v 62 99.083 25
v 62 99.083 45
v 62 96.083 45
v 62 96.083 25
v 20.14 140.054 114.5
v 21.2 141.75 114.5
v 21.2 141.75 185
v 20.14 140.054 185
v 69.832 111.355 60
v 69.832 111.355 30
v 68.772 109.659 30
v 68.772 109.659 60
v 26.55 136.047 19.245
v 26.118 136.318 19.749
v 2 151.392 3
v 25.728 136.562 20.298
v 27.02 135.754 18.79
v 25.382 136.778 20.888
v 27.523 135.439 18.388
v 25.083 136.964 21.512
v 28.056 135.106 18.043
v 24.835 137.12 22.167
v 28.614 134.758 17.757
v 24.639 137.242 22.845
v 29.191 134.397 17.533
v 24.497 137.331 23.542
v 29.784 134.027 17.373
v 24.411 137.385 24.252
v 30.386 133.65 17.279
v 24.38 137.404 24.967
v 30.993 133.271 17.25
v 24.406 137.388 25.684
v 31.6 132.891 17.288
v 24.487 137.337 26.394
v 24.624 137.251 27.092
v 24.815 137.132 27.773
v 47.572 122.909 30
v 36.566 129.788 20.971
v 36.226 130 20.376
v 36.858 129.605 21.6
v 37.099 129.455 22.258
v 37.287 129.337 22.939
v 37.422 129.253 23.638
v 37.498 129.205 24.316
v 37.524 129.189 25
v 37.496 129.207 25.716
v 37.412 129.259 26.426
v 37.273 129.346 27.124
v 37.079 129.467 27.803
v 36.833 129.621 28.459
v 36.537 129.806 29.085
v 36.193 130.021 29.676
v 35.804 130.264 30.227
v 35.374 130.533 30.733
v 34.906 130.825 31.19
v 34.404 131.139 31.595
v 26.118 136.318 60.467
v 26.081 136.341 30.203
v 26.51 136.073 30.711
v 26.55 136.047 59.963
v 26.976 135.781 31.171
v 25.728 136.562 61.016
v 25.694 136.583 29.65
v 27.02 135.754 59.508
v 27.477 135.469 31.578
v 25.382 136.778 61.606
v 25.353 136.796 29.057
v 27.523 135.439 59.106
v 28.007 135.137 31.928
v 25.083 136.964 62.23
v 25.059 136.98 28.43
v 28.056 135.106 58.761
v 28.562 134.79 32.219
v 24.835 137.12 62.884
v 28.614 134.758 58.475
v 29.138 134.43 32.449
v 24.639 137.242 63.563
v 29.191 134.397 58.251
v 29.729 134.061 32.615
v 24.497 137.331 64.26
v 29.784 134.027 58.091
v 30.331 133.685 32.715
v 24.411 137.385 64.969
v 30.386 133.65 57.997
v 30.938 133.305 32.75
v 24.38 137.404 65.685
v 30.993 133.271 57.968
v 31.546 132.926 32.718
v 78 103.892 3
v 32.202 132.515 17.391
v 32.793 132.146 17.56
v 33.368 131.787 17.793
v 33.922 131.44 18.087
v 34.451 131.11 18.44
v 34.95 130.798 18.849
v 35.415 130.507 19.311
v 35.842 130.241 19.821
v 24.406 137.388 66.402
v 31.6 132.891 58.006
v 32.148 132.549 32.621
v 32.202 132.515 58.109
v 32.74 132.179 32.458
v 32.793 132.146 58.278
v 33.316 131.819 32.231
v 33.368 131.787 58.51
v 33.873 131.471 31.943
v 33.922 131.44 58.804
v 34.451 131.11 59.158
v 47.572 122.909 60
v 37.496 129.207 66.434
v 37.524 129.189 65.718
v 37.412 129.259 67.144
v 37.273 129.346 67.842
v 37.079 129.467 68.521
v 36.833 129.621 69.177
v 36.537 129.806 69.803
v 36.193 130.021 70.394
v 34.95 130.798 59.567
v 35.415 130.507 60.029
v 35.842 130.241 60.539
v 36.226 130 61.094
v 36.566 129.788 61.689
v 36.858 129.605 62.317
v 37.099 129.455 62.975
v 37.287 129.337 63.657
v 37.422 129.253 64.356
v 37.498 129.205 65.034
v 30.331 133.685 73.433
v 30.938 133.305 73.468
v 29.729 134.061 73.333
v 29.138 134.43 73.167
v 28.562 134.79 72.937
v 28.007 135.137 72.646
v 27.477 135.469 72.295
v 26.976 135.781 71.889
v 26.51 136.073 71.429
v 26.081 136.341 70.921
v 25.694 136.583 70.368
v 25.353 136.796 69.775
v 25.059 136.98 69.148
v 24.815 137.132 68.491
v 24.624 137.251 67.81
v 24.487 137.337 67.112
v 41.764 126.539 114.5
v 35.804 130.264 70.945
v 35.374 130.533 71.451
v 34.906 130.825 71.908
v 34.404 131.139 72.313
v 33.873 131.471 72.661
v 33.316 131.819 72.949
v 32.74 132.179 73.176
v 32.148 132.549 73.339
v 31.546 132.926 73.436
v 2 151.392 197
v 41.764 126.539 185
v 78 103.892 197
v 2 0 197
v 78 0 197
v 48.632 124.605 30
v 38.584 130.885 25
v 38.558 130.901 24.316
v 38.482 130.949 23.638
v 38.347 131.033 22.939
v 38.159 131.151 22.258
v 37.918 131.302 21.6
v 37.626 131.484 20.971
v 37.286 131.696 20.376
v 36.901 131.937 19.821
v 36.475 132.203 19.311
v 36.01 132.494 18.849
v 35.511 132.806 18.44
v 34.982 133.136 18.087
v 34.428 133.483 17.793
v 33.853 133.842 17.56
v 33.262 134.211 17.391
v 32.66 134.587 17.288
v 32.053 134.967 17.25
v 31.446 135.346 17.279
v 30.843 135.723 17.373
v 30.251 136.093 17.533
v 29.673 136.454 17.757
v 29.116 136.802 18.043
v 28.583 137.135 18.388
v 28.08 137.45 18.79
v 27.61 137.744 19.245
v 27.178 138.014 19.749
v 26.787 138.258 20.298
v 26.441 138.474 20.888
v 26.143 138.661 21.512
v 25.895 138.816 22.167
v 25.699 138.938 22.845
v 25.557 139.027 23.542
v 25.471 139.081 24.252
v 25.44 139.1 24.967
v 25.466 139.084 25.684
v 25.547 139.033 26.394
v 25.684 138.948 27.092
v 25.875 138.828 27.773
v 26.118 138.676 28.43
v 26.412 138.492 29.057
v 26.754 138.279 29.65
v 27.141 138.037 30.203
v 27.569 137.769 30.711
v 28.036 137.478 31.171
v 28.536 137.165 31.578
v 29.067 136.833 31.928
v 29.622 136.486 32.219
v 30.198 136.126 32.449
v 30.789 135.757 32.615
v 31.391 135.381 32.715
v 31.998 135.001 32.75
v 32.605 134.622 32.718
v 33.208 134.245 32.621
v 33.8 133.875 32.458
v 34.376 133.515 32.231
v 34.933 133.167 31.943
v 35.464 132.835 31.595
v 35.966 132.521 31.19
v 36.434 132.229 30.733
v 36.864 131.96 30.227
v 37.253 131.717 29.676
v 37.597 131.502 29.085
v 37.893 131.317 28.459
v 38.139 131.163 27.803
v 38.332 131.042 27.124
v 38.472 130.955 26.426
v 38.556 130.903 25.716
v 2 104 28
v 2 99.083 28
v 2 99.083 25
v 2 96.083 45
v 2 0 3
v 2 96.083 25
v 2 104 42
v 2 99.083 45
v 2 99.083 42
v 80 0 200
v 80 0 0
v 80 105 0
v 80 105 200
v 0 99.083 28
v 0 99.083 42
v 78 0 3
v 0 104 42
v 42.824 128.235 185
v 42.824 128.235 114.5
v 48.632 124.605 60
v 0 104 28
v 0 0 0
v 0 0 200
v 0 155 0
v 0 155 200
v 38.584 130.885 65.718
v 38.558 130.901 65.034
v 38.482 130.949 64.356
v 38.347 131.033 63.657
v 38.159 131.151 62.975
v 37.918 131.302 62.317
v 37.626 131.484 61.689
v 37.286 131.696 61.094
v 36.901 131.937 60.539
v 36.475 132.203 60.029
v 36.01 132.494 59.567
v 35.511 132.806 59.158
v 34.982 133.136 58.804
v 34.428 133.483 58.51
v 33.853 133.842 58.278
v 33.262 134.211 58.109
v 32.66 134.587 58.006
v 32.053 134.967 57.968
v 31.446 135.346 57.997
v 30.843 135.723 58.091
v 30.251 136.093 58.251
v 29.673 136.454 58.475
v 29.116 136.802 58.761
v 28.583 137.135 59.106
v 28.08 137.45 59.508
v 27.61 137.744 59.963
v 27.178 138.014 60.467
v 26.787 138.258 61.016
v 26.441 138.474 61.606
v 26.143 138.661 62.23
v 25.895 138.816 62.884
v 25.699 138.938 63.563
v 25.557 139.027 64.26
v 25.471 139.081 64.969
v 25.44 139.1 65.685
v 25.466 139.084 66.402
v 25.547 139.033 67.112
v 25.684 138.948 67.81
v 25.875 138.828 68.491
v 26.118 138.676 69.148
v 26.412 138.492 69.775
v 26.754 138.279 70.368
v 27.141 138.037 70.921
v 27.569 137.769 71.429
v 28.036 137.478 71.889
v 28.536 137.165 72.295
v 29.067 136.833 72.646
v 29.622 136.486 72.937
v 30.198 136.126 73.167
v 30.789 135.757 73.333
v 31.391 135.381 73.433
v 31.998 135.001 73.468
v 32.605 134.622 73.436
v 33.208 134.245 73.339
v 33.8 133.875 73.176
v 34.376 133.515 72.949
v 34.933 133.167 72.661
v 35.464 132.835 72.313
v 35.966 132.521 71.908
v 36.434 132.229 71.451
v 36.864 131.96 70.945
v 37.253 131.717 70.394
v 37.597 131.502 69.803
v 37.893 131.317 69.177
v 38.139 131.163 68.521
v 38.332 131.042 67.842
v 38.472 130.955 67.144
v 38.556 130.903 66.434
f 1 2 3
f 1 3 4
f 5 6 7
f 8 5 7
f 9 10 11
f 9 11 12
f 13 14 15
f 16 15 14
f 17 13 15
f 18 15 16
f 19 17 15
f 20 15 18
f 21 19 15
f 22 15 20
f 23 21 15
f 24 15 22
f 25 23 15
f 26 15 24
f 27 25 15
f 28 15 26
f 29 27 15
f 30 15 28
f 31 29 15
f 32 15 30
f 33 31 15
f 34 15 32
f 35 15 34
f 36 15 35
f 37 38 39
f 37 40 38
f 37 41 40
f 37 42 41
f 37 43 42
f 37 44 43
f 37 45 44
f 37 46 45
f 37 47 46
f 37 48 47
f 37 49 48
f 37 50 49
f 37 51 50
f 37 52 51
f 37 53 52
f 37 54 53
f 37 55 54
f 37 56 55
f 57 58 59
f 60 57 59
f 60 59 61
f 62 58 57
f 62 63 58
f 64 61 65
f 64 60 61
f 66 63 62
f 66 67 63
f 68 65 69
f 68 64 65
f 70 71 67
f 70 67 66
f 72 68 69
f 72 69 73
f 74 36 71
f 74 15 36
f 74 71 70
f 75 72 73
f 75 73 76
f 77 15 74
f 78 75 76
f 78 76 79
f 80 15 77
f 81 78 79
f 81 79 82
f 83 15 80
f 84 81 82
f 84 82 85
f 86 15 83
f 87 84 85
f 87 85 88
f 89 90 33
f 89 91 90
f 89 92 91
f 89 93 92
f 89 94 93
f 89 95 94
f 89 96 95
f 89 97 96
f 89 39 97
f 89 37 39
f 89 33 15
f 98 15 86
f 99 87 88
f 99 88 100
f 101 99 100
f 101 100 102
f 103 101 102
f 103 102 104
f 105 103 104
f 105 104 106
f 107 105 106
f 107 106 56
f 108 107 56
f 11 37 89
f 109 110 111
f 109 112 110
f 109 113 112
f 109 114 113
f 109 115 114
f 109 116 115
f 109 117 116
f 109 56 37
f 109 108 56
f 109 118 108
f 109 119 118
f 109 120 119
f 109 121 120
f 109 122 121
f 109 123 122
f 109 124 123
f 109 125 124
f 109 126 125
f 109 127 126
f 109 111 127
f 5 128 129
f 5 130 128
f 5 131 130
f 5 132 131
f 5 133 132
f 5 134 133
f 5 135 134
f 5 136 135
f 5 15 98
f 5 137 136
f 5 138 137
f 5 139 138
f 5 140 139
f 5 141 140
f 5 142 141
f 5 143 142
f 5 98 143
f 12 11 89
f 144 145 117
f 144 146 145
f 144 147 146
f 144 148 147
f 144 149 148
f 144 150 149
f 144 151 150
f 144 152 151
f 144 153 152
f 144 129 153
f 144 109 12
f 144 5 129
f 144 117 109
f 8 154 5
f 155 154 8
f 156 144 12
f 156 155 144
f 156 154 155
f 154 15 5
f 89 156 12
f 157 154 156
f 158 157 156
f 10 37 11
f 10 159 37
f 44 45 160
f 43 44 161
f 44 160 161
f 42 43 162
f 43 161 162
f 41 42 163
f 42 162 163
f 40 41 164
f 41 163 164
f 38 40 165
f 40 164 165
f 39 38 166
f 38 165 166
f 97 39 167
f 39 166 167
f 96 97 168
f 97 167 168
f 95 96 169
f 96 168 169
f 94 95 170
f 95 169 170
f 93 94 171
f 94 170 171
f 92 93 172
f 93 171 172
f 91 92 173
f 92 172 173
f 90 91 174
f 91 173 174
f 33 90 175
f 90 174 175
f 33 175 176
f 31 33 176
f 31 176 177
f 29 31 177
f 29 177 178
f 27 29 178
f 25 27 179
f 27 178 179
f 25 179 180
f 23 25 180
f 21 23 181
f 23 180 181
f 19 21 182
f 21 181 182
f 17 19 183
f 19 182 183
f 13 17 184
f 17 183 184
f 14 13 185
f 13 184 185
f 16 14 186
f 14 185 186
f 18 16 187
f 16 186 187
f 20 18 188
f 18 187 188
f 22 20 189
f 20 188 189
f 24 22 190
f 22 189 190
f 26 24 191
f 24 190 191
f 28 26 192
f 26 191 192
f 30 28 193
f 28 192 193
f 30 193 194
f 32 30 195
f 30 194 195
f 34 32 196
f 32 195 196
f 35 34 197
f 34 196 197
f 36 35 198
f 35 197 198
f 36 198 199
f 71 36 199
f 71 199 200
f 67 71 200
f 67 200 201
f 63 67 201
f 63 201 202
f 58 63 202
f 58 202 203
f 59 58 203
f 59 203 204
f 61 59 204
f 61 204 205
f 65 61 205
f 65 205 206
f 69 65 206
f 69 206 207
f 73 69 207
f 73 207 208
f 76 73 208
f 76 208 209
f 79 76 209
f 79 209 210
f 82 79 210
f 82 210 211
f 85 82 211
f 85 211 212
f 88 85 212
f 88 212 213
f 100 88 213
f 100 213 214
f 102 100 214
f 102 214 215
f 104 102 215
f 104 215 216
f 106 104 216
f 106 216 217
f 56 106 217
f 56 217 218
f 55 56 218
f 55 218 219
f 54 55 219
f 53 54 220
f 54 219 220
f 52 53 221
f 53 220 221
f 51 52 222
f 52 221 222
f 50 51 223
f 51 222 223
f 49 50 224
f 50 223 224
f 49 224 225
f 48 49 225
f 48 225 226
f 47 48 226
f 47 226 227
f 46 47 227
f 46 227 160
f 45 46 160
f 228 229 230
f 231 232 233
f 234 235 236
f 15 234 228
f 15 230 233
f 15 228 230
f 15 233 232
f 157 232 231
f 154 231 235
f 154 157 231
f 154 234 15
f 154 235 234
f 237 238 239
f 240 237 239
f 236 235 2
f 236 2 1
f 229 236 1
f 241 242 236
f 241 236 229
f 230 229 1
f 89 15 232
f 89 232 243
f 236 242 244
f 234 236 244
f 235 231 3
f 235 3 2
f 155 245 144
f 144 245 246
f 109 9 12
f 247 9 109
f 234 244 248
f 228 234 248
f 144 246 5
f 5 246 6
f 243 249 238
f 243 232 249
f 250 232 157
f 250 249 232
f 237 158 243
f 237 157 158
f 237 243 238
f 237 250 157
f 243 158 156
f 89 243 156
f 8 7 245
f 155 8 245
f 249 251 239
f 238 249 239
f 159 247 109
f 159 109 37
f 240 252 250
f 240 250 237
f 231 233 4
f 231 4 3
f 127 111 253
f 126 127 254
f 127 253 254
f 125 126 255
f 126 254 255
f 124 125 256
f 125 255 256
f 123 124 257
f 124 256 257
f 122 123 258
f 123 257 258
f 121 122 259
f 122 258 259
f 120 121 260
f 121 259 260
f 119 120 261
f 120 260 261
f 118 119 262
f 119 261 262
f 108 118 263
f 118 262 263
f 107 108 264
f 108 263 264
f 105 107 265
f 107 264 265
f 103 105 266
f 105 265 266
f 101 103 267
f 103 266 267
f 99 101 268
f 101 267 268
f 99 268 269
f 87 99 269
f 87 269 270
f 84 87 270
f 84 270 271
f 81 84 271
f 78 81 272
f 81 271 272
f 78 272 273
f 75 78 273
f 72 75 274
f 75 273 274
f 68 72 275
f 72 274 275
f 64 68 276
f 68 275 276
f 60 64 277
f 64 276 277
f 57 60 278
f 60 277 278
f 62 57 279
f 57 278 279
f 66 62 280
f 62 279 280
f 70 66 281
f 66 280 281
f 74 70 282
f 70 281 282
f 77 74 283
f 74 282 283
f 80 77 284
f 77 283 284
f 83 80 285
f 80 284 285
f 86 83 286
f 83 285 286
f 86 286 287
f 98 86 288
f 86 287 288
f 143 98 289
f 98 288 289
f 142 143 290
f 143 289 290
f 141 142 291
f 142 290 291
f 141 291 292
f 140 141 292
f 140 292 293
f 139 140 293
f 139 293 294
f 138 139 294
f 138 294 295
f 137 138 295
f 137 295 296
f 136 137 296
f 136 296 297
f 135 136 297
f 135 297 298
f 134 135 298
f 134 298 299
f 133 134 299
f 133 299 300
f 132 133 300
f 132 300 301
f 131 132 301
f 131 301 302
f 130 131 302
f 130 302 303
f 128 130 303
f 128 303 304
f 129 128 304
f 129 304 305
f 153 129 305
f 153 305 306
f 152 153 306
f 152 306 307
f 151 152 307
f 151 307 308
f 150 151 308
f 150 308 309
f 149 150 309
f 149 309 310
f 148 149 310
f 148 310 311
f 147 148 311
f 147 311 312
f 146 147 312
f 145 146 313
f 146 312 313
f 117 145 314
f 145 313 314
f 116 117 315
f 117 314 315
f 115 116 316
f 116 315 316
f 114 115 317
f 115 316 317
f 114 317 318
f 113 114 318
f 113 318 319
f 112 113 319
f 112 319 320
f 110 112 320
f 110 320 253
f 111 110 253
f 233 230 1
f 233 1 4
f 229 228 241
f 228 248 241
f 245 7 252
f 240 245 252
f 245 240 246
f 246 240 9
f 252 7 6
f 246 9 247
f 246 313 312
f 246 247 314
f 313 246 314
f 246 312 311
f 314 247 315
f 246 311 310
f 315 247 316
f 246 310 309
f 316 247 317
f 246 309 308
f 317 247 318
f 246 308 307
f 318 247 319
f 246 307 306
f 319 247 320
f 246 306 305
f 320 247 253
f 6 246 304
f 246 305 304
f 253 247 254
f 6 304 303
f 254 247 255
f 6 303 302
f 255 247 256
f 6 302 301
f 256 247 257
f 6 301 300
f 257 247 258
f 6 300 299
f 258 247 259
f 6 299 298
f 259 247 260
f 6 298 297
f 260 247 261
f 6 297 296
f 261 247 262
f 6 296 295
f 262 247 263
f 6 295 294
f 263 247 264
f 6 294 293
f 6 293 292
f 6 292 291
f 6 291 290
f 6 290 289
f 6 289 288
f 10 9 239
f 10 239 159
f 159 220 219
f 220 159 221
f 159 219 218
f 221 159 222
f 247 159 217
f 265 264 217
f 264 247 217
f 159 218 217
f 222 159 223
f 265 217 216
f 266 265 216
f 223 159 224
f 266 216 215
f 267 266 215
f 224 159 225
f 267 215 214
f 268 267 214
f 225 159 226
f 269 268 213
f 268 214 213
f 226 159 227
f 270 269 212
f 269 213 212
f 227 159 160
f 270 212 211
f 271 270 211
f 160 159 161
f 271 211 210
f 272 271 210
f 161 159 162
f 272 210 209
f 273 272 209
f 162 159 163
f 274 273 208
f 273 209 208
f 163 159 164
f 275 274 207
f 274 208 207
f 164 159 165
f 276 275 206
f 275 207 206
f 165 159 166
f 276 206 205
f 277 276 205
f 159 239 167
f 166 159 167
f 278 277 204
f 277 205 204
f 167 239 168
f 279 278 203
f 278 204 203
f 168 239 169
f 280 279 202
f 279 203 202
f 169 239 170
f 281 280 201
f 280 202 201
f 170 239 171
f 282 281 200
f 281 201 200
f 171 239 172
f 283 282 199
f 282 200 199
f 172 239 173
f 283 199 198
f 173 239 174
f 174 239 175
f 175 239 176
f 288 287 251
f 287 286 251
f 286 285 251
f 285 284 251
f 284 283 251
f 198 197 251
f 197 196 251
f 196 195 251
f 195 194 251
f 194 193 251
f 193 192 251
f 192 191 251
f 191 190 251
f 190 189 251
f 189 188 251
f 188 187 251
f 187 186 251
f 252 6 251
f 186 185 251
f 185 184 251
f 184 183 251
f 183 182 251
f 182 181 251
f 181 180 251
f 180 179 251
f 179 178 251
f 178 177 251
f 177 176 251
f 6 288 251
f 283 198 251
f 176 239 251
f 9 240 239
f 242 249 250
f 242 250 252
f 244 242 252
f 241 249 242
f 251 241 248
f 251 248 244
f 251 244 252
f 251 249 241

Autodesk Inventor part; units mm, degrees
ref_plane "YZ Plane" through (0, 0, 0) normal (1, 0, 0) x (0, 1, 0)
ref_plane "XZ Plane" through (0, 0, 0) normal (0, 1, 0) x (-1, 0, 0)
ref_plane "XY Plane" through (0, 0, 0) normal (0, 0, 1) x (1, 0, 0)
sketch "Sketch1" plane through (0, 0, 0) normal (0, 0, 1) x (1, 0, 0)
  line L0 (0, 0) -> (80, 0)
  line L1 (0, 0) -> (0, 155)
  line L2 (80, 0) -> (80, 105)
  line L3 (80, 105) -> (0, 155)
  dimension "d0" = 80
  dimension "d1" = 155
  dimension "d2" = 105
extrude "Extrusion1" add sketch "Sketch1" along normal blind 200
sketch "Sketch3" plane through (0, 0, 200) normal (0, 0, 1) x (1, 0, 0)
  line L0 (2, 0) -> (2, 151.3915)
  line L1 (80, 0) -> (80, 105) projected
  line L2 (78, 0) -> (78, 103.8915)
  line L3 (80, 105) -> (0, 155) projected
  line L4 (2, 151.3915) -> (78, 103.8915)
  line L5 (0, 0) -> (80, 0) projected
  line L6 (2, 0) -> (78, 0)
  line L7 (0, 155) -> (0, 0) projected
  dimension "d23" = 2
  dimension "d24" = 2
  dimension "d25" = 2
extrude "Extrusion3" cut sketch "Sketch3" against normal blind 197 contours L0 L4 L2 L5
extrude "Extrusion4" add sketch "Sketch3" against normal blind 3 contours L0 L4 L2 L5
sketch "Sketch4" plane through (0, 0, 0) normal (-1, 0, 0) x (0, 0, 1)
  line L0 (0, 155) -> (0, 0) projected
  line L1 (0, 155) -> (0, 105)
  line L2 (28, 99.083) -> (42, 99.083)
  line L3 (42, 99.083) -> (42, 104)
  line L4 (42, 104) -> (28, 104)
  line L5 (28, 104) -> (28, 99.083)
  line L6 (28, 99.083) -> (42, 99.083)
  line L7 (0, 155) -> (0, 105)
  line L8 (0, 155) -> (200, 155) projected
  line L9 (28, 99.083) -> (42, 99.083)
  point P0 (28, 101.5415)
  dimension "d47" = 28
  dimension "d48" = 51
extrude "Extrusion5" cut sketch "Sketch4" against normal blind 10
sketch "Sketch5" plane through (2, 0, 3) normal (1, 0, 0) x (0, 0, -1)
  line L0 (-25, 99.083) -> (-39, 99.083) projected
  line L1 (-25, 99.083) -> (-22, 99.083)
  line L2 (-39, 99.083) -> (-42, 99.083)
  line L3 (-42, 99.083) -> (-22, 99.083)
  line L4 (-22, 99.083) -> (-22, 96.083)
  line L5 (-22, 96.083) -> (-42, 96.083)
  line L6 (-42, 96.083) -> (-42, 99.083)
  point P0 (3, 0)
  dimension "d42" = 3
  dimension "d43" = 3
  dimension "d44" = 3
extrude "Extrusion6" add sketch "Sketch5" along normal blind 60
sketch "Sketch6" plane through (0, 155, 200) normal (0.53, 0.848, 0) x (0.848, -0.53, 0)
  line L0 (25, 15) -> (50.5, 15)
  line L1 (50.5, 15) -> (50.5, 85.5)
  line L2 (50.5, 85.5) -> (25, 85.5)
  line L3 (25, 85.5) -> (25, 15)
  line L4 (94.3398, 0) -> (0, 0) projected
  line L5 (0, 200) -> (0, 0) projected
  line L6 (32.9219, 175) -> (83.8018, 175) projected
  circle A0 centre (37.75, 175) radius 7.75
  circle A1 centre (37.75, 134.2821) radius 7.75
  line L7 (82.3488, 140) -> (57.3488, 140)
  line L8 (57.3488, 140) -> (57.3488, 170)
  line L9 (57.3488, 170) -> (82.3488, 170)
  line L10 (82.3488, 170) -> (82.3488, 140)
  line L11 (31.3319, 155) -> (82.2118, 155) projected
  line L12 (82.3488, 140) -> (57.3488, 170) construction
  line L13 (57.3488, 140) -> (82.3488, 170) construction
  point P0 (82.1498, 200)
  point P1 (69.8488, 155)
  dimension "d49" = 25.5
  dimension "d50" = 70.5
  dimension "d51" = 15
  dimension "d52" = 25
  dimension "d53" = 15.5
  dimension "d54" = 15.5
  dimension "d55" = 25
  dimension "d56" = 30
extrude "Extrusion7" cut sketch "Sketch6" against normal blind 10
properties part number "Housing og Buttons & LCD"
